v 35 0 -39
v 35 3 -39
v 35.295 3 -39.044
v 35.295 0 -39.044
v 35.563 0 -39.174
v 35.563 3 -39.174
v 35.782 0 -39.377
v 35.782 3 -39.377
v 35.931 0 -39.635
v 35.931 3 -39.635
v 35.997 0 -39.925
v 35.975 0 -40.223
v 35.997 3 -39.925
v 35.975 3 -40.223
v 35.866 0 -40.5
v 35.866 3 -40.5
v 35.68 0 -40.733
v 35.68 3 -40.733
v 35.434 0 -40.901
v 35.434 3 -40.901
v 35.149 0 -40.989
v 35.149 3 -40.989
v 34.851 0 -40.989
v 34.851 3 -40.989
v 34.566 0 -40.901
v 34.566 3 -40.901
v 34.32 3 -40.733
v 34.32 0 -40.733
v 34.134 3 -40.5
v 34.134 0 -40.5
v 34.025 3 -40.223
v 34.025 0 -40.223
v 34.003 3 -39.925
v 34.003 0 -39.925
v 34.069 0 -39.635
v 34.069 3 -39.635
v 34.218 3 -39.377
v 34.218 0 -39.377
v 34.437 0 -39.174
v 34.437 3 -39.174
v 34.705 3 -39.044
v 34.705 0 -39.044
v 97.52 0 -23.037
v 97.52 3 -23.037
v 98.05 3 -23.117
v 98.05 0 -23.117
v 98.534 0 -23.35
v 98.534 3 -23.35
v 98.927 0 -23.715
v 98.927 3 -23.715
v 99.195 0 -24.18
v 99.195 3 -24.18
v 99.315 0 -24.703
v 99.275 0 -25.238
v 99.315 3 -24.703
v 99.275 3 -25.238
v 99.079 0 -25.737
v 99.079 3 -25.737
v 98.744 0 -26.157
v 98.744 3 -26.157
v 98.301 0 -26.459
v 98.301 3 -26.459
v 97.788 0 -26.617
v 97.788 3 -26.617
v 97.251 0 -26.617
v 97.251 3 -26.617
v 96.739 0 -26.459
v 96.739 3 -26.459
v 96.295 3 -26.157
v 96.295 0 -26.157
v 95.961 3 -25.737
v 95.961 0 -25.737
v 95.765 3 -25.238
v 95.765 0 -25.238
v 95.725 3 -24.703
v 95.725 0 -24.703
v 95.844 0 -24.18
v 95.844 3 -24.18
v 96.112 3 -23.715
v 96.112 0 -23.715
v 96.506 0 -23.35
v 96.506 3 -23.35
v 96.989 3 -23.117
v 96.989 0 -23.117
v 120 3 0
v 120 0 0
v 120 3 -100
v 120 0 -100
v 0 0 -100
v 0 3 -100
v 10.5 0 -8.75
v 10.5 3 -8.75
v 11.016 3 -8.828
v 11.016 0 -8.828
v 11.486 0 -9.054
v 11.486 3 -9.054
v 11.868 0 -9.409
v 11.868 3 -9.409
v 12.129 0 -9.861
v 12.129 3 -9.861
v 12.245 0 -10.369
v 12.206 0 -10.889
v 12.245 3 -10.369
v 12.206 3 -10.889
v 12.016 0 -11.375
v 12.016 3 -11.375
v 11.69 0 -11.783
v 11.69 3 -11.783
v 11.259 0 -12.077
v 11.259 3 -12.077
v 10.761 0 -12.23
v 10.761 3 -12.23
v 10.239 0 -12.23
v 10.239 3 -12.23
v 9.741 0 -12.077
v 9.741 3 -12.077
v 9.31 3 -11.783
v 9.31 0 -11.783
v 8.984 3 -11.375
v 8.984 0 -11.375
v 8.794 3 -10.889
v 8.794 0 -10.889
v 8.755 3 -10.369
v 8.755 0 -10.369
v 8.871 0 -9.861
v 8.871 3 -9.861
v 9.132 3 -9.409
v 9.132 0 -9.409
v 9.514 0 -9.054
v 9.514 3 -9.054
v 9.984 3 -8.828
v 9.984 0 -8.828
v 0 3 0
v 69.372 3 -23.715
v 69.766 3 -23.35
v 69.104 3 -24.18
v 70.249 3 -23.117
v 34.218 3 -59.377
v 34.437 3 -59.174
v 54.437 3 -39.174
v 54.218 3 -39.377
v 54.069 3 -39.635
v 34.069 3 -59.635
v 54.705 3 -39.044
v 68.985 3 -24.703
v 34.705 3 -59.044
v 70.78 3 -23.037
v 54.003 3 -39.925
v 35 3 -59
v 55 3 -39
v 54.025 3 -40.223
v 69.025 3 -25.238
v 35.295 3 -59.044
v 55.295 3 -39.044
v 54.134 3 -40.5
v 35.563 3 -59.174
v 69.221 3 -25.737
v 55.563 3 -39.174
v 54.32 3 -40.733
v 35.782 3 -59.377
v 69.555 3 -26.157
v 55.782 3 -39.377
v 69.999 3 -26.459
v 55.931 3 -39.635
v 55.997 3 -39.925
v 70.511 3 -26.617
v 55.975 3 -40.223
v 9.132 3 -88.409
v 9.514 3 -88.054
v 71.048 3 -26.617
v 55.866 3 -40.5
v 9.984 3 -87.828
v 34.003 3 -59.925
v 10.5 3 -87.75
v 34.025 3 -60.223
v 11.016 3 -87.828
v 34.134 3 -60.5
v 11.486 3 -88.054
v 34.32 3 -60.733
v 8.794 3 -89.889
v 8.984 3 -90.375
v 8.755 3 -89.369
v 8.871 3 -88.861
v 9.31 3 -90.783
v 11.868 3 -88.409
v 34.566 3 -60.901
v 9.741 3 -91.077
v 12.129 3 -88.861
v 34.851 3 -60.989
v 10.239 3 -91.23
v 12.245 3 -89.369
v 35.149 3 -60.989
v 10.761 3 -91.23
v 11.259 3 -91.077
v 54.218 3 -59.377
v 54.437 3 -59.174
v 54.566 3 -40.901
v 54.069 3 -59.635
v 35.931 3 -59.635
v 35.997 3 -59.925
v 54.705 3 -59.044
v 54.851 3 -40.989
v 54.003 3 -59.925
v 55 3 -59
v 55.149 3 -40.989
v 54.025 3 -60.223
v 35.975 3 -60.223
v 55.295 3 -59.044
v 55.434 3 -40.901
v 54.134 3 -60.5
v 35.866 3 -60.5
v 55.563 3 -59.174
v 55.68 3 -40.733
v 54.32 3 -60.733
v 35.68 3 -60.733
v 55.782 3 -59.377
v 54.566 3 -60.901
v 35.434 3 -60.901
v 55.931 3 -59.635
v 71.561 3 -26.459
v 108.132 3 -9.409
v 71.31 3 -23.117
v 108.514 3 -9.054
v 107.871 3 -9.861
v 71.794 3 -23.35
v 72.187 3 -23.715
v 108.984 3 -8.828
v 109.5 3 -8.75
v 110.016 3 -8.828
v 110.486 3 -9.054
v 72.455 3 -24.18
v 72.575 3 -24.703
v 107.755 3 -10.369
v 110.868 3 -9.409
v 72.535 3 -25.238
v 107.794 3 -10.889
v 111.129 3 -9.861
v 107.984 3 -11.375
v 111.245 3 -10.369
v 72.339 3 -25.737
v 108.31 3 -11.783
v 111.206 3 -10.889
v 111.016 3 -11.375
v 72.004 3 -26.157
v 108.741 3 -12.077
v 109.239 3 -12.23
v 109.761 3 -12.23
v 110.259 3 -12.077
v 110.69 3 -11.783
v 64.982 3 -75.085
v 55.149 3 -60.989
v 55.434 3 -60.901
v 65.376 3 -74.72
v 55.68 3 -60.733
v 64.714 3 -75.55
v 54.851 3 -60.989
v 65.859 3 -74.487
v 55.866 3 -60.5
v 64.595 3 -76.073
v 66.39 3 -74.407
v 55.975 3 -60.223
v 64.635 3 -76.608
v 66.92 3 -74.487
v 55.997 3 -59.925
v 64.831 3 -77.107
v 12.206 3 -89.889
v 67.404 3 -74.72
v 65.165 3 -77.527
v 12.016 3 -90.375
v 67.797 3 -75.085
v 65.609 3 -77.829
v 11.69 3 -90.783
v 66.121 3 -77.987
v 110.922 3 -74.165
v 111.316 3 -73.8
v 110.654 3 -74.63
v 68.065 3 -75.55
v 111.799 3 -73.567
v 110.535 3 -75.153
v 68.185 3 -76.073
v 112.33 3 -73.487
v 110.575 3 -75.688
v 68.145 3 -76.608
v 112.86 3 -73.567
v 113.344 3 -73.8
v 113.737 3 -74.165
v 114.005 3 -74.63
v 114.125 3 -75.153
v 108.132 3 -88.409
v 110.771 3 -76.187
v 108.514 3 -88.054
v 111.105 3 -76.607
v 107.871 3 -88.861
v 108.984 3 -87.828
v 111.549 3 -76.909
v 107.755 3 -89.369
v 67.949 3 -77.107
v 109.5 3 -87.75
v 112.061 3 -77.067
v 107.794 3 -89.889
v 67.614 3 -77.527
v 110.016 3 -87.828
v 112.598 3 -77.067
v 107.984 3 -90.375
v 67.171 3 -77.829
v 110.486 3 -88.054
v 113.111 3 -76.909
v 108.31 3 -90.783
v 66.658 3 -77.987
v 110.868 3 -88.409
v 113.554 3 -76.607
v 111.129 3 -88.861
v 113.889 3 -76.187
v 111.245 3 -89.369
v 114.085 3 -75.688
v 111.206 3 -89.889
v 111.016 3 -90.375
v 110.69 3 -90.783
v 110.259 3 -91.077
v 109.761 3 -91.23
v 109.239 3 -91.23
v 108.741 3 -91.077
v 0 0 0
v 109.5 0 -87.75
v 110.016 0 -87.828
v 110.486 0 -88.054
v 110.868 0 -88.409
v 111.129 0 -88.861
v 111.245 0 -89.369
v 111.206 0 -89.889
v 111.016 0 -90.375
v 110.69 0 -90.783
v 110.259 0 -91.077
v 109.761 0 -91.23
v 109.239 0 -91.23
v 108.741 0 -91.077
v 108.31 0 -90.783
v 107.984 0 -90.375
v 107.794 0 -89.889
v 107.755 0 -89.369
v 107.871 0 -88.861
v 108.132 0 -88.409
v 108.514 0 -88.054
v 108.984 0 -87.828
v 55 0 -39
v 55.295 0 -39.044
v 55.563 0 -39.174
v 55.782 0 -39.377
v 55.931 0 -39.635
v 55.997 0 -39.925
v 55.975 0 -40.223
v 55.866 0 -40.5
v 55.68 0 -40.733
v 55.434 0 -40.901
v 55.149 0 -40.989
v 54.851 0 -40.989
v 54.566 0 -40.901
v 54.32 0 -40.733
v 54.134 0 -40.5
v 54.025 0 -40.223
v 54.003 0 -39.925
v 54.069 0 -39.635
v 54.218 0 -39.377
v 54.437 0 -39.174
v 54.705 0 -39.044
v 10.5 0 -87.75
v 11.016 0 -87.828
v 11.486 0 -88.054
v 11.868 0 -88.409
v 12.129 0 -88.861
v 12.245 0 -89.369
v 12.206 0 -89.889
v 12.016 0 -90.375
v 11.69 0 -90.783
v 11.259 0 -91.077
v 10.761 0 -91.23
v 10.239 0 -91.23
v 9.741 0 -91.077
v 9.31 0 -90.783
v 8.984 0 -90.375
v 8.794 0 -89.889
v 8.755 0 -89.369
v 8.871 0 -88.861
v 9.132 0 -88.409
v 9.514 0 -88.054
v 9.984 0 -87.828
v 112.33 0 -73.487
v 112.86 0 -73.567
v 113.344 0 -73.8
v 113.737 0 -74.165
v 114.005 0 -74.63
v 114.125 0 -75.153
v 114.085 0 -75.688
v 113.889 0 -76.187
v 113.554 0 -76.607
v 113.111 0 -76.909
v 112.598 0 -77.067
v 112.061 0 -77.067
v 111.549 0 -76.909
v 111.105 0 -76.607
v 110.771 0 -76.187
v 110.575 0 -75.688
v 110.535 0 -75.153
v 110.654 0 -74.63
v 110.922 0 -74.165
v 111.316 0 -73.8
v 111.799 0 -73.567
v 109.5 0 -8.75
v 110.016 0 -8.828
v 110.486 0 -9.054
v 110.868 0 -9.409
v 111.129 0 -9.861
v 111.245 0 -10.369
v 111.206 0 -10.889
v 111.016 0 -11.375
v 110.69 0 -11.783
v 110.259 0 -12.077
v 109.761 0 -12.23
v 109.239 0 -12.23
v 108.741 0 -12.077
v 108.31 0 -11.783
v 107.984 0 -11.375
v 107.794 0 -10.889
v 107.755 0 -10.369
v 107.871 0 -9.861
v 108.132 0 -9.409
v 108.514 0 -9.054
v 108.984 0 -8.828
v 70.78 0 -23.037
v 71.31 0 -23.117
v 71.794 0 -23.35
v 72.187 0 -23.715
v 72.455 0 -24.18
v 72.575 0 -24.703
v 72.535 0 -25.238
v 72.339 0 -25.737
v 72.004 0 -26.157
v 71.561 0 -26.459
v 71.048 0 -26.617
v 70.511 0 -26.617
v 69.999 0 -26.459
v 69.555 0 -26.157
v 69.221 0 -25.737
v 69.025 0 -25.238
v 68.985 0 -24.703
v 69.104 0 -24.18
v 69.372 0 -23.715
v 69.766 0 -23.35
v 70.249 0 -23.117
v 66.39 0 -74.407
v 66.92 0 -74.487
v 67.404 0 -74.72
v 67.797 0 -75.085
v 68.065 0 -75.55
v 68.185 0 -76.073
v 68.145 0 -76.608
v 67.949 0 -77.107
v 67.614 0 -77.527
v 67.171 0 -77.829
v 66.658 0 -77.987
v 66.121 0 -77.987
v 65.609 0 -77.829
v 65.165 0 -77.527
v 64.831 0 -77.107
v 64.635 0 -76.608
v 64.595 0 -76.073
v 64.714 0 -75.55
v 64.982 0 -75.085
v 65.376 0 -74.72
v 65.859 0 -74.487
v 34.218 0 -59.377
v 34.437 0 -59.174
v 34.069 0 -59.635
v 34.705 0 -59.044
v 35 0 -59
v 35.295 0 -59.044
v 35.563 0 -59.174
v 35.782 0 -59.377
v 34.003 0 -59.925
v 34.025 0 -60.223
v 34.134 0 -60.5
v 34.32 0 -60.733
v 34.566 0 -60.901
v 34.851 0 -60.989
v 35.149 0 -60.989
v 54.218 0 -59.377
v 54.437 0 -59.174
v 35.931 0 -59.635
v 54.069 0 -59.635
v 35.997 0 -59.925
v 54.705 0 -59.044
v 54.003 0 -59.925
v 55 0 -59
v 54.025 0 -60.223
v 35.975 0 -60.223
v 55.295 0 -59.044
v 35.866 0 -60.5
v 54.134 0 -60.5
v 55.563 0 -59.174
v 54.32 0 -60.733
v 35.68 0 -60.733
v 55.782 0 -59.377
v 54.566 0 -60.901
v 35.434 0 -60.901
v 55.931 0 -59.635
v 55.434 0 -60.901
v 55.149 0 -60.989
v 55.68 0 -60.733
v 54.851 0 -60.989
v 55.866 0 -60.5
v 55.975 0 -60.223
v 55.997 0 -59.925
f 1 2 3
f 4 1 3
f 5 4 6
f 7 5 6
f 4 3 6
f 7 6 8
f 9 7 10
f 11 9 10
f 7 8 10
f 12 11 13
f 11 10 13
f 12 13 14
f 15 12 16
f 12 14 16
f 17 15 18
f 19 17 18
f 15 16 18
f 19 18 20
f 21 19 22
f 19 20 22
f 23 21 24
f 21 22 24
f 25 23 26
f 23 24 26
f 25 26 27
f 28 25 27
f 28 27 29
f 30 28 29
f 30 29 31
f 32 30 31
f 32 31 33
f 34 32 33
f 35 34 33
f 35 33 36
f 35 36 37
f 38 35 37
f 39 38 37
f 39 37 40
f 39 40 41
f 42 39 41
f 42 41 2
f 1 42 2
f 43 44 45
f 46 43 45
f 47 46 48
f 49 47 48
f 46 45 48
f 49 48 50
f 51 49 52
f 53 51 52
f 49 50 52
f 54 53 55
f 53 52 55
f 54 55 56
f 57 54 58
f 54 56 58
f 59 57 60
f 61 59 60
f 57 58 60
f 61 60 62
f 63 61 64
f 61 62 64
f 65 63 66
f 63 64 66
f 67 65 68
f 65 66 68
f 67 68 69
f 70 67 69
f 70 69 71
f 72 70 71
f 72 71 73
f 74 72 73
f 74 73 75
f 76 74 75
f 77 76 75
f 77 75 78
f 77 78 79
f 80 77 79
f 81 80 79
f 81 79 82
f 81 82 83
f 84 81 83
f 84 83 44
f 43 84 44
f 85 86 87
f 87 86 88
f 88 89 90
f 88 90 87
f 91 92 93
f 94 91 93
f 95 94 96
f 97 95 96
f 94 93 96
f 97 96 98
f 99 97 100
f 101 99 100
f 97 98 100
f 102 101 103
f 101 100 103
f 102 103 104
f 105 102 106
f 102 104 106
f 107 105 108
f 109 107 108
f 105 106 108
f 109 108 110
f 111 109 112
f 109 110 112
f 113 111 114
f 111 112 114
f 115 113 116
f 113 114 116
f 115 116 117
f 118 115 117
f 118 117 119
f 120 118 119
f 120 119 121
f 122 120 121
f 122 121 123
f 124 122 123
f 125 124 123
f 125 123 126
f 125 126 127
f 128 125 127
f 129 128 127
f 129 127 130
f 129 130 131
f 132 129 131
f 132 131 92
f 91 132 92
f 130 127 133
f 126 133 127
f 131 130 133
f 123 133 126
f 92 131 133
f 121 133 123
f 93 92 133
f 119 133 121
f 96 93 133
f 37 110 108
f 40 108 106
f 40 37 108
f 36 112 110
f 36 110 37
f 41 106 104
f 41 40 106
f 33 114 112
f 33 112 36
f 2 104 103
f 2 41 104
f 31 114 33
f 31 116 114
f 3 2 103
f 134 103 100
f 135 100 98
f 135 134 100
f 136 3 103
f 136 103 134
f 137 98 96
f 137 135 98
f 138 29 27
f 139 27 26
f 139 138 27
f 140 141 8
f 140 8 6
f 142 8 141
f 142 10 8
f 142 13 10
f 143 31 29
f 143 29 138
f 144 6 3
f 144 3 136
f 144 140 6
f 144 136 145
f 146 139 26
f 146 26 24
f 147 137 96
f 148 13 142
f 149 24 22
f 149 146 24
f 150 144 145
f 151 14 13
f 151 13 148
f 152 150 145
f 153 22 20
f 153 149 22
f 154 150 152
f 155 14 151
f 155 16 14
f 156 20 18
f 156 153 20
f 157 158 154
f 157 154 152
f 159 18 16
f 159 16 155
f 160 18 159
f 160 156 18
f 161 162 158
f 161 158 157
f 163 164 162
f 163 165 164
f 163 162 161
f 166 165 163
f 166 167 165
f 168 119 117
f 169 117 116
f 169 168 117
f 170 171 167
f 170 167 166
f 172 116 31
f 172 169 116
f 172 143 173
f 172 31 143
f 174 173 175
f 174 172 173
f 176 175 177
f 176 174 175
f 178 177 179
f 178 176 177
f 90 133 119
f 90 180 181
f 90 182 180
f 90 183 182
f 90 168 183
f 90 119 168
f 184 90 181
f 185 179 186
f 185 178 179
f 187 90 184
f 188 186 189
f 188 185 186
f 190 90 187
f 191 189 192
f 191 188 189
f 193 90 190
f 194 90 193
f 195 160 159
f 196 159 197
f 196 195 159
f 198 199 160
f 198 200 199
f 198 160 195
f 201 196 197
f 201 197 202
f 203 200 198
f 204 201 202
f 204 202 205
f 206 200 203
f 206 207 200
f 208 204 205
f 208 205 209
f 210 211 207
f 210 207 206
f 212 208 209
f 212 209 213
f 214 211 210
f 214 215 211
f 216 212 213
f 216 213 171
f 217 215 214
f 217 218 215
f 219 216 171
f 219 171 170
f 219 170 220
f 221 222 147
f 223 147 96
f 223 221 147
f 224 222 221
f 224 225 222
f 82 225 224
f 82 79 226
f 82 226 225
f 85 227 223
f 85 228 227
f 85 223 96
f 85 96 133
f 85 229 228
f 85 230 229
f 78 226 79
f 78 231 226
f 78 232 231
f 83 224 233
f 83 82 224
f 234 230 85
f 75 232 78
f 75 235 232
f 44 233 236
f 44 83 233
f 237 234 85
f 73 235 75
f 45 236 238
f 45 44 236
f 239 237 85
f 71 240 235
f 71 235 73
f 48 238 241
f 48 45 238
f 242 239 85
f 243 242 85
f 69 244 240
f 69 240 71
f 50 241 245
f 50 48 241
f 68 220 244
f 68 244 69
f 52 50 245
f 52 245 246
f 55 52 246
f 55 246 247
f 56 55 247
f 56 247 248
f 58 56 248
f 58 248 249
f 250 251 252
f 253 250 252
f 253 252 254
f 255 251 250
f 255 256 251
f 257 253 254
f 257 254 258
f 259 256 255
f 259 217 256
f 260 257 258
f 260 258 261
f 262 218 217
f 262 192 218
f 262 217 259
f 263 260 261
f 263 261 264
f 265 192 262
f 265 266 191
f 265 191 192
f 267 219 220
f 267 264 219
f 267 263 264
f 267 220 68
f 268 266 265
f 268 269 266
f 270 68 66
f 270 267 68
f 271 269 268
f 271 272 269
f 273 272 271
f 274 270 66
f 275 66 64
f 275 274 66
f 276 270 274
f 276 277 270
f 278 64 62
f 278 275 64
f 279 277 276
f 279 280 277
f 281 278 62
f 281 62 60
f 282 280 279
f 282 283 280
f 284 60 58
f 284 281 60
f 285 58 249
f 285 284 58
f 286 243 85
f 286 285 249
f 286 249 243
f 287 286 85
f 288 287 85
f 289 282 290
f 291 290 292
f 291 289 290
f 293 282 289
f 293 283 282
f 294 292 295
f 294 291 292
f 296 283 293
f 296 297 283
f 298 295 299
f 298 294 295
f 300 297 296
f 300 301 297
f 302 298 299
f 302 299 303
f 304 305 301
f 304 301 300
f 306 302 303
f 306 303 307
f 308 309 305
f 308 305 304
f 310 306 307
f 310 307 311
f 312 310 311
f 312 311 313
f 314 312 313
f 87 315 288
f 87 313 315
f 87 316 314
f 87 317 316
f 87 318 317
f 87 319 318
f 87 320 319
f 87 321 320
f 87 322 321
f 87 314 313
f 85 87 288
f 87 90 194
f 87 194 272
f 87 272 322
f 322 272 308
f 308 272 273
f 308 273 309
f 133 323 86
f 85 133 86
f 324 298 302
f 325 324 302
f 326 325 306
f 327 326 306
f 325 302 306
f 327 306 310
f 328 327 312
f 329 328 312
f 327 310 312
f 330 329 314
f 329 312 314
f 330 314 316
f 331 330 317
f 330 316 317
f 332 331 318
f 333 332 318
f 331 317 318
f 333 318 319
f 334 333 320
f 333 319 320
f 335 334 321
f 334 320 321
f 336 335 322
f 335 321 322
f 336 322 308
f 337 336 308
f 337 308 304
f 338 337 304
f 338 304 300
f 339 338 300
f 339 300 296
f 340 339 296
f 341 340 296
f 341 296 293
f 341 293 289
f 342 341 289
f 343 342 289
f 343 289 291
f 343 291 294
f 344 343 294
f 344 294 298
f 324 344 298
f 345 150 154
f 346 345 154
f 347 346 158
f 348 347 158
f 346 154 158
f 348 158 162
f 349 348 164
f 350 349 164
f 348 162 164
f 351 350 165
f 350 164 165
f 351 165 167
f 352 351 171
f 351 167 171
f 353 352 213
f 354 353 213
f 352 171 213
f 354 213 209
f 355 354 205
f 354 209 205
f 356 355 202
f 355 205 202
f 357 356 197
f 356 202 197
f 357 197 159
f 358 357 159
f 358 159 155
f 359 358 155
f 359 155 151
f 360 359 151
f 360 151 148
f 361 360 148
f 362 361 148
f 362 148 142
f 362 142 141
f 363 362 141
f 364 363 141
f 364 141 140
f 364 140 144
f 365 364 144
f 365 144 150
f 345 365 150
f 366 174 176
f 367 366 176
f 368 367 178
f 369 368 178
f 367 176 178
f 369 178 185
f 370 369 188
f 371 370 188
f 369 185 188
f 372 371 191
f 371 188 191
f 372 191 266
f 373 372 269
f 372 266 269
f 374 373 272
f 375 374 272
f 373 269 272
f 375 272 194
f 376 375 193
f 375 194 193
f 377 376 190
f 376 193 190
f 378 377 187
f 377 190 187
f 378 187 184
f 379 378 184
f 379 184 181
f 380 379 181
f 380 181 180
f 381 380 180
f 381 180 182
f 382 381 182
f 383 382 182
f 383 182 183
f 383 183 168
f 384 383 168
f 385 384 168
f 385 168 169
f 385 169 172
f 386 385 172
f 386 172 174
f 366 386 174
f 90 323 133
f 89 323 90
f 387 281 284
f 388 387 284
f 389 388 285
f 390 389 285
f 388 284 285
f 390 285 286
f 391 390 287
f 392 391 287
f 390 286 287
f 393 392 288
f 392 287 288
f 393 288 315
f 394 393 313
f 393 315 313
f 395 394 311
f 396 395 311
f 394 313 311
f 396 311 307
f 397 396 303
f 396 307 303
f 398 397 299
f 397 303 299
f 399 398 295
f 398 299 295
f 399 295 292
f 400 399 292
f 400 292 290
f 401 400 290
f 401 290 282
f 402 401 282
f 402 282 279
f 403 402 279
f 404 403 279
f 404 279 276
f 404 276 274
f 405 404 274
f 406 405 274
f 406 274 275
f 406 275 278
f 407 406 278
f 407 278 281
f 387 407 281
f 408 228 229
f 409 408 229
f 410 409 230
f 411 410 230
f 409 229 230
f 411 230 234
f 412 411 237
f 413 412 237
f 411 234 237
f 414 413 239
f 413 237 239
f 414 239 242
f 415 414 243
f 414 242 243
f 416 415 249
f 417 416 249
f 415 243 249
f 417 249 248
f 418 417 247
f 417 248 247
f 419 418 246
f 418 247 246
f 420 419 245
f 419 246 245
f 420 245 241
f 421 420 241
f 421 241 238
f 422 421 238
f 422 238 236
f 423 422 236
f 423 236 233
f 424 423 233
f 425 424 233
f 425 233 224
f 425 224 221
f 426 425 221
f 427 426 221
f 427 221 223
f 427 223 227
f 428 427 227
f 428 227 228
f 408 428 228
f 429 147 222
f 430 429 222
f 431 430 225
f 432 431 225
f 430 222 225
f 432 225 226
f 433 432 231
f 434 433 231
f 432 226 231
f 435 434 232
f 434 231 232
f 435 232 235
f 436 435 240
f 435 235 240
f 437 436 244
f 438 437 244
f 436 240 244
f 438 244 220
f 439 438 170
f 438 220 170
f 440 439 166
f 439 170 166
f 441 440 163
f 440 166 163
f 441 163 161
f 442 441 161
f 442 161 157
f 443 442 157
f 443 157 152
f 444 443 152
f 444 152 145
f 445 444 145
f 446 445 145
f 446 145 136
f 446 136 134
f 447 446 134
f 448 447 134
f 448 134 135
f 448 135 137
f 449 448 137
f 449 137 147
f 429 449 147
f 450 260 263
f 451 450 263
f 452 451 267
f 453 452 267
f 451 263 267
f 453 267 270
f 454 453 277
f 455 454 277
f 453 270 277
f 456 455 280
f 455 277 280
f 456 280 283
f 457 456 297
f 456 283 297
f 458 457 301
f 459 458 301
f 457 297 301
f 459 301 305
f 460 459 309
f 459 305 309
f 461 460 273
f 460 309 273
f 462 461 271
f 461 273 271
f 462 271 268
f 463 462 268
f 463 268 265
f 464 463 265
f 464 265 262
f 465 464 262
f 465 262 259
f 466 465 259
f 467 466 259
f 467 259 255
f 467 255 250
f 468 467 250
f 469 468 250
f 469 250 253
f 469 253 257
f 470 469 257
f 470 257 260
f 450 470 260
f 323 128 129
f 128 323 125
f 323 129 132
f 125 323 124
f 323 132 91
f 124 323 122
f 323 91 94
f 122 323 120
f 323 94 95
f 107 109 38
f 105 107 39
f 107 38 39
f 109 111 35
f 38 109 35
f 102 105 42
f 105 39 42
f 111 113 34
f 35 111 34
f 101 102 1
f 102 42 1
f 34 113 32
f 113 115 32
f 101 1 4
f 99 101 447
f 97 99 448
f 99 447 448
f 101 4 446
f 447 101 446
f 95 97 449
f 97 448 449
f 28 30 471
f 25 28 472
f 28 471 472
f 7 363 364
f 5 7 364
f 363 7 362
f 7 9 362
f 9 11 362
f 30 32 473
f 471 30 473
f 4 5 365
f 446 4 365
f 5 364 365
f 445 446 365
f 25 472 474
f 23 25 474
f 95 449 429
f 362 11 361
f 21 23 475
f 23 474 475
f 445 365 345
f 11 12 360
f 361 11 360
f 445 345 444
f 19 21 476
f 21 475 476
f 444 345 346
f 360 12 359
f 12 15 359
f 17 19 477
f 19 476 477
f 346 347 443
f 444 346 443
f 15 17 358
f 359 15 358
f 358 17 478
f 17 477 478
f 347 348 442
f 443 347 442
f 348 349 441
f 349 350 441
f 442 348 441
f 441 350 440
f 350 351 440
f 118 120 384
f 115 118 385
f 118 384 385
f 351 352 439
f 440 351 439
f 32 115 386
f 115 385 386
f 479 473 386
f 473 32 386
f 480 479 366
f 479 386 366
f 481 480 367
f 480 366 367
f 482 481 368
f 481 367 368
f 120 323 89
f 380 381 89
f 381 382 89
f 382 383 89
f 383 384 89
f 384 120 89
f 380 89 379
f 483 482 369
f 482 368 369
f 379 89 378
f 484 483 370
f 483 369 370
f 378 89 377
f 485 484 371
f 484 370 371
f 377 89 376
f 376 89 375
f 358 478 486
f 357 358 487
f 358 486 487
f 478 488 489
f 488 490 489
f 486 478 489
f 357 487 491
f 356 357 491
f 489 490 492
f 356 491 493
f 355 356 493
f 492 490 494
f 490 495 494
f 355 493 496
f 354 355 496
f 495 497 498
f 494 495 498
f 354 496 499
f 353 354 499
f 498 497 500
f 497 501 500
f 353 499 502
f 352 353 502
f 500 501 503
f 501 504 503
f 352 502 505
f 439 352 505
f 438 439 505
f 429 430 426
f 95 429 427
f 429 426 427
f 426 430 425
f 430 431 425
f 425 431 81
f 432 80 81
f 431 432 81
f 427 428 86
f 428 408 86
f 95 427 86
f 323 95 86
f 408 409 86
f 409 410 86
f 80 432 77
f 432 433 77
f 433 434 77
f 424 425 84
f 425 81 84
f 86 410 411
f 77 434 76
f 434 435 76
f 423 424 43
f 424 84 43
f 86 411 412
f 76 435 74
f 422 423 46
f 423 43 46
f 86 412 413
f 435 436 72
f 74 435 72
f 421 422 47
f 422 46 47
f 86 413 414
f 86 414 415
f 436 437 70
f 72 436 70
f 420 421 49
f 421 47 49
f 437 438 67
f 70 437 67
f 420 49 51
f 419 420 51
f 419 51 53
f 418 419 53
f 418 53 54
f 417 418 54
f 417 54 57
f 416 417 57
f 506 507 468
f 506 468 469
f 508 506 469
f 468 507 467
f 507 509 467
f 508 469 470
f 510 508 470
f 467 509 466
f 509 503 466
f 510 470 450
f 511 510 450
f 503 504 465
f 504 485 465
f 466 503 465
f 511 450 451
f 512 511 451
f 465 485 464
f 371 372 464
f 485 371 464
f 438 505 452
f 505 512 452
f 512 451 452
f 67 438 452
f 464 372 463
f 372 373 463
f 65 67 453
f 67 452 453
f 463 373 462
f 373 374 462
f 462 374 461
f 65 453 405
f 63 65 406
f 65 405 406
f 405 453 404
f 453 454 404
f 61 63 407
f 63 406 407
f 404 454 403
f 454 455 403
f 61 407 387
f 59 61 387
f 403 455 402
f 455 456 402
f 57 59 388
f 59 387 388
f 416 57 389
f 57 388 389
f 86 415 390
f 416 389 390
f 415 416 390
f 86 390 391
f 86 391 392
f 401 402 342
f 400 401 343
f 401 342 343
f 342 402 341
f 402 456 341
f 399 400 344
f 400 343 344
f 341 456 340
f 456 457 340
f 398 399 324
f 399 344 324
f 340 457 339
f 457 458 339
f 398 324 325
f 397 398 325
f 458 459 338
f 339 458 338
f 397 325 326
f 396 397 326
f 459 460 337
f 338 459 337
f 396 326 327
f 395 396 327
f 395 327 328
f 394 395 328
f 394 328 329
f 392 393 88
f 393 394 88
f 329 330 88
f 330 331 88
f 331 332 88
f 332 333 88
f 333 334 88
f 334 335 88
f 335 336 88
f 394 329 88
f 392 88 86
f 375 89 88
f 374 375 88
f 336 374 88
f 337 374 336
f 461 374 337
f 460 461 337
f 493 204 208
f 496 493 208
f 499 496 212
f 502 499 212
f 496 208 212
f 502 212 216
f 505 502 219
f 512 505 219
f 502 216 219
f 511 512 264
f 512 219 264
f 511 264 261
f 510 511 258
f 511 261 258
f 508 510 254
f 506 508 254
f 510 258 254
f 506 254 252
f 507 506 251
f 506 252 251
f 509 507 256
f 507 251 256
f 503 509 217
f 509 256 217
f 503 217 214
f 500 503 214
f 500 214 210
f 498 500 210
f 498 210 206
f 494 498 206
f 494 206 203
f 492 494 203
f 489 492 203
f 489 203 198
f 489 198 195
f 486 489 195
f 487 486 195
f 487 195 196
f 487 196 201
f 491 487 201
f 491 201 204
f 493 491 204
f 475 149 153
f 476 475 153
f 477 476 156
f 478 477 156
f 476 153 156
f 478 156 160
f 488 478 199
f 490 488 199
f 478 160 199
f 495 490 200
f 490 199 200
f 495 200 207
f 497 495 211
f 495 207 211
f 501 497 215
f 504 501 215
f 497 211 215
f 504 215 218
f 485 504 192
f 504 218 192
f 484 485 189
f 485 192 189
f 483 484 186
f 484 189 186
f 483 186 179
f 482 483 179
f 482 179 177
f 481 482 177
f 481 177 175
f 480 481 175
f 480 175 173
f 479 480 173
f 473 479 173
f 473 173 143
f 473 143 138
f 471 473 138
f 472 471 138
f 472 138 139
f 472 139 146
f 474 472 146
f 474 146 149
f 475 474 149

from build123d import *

# Parameters (mm, degrees)
SKETCH1_W           = 120
SKETCH1_H           = 100
BOSS_EXTRUDE1_DEPTH = 3
SKETCH2_R           = 1.75
HOLES_SPACERS_DEPTH = 10
HOLES_IMU_REACH     = 158.234
SKETCH3_R           = 1
HOLES_ARDUINO_REACH = 158.234
SKETCH4_R           = 1.8


with BuildPart() as part:
    # Sketch1 → Boss-Extrude1 (new body)
    with BuildSketch(Plane(origin=(0, 0, 0), x_dir=(1, 0, 0), z_dir=(0, 1, 0))):
        with Locations((60, 50)):
            Rectangle(SKETCH1_W, SKETCH1_H)
    extrude(amount=BOSS_EXTRUDE1_DEPTH)

    # Sketch2 → holes_spacers (cut)
    with BuildSketch(Plane(origin=(0, 3, 0), x_dir=(1, 0, 0), z_dir=(0, 1, 0))):
        with Locations(Location((10.5, 89.5, 0), (0, 0, 270))):
            Circle(SKETCH2_R)
        with Locations(Location((109.5, 89.5, 0), (0, 0, 270))):
            Circle(SKETCH2_R)
        with Locations(Location((109.5, 10.5, 0), (0, 0, 270))):
            Circle(SKETCH2_R)
        with Locations(Location((10.5, 10.5, 0), (0, 0, 270))):
            Circle(SKETCH2_R)
    extrude(amount=-HOLES_SPACERS_DEPTH, mode=Mode.SUBTRACT)

    # Sketch3 → holes_IMU (cut, up to next)
    with BuildSketch(Plane(origin=(0, 3, 0), x_dir=(1, 0, 0), z_dir=(0, 1, 0)), mode=Mode.PRIVATE) as holes_imu_sk1:
        with Locations(Location((35, 60, 0), (0, 0, 270))):
            Circle(SKETCH3_R)
    holes_imu_tool1 = extrude(holes_imu_sk1.sketch, amount=-HOLES_IMU_REACH, mode=Mode.PRIVATE) & part.part
    # Sketch3 → holes_IMU (cut, up to next)
    with BuildSketch(Plane(origin=(0, 3, 0), x_dir=(1, 0, 0), z_dir=(0, 1, 0)), mode=Mode.PRIVATE) as holes_imu_sk2:
        with Locations(Location((55, 60, 0), (0, 0, 270))):
            Circle(SKETCH3_R)
    holes_imu_tool2 = extrude(holes_imu_sk2.sketch, amount=-HOLES_IMU_REACH, mode=Mode.PRIVATE) & part.part
    # Sketch3 → holes_IMU (cut, up to next)
    with BuildSketch(Plane(origin=(0, 3, 0), x_dir=(1, 0, 0), z_dir=(0, 1, 0)), mode=Mode.PRIVATE) as holes_imu_sk3:
        with Locations(Location((55, 40, 0), (0, 0, 270))):
            Circle(SKETCH3_R)
    holes_imu_tool3 = extrude(holes_imu_sk3.sketch, amount=-HOLES_IMU_REACH, mode=Mode.PRIVATE) & part.part
    # Sketch3 → holes_IMU (cut, up to next)
    with BuildSketch(Plane(origin=(0, 3, 0), x_dir=(1, 0, 0), z_dir=(0, 1, 0)), mode=Mode.PRIVATE) as holes_imu_sk4:
        with Locations(Location((35, 40, 0), (0, 0, 270))):
            Circle(SKETCH3_R)
    holes_imu_tool4 = extrude(holes_imu_sk4.sketch, amount=-HOLES_IMU_REACH, mode=Mode.PRIVATE) & part.part
    add(holes_imu_tool1.solids().sort_by_distance((35, 3, -60))[0], mode=Mode.SUBTRACT)
    add(holes_imu_tool2.solids().sort_by_distance((55, 3, -60))[0], mode=Mode.SUBTRACT)
    add(holes_imu_tool3.solids().sort_by_distance((55, 3, -40))[0], mode=Mode.SUBTRACT)
    add(holes_imu_tool4.solids().sort_by_distance((35, 3, -40))[0], mode=Mode.SUBTRACT)

    # Sketch4 → holes_arduino (cut, up to next)
    with BuildSketch(Plane(origin=(0, 3, 0), x_dir=(1, 0, 0), z_dir=(0, 1, 0)), mode=Mode.PRIVATE) as holes_arduino_sk1:
        with Locations(Location((66.389668811, 76.207441627, 0), (0, 0, 270))):
            Circle(SKETCH4_R)
    holes_arduino_tool1 = extrude(holes_arduino_sk1.sketch, amount=-HOLES_ARDUINO_REACH, mode=Mode.PRIVATE) & part.part
    # Sketch4 → holes_arduino (cut, up to next)
    with BuildSketch(Plane(origin=(0, 3, 0), x_dir=(1, 0, 0), z_dir=(0, 1, 0)), mode=Mode.PRIVATE) as holes_arduino_sk2:
        with Locations(Location((112.329668811, 75.287441627, 0), (0, 0, 270))):
            Circle(SKETCH4_R)
    holes_arduino_tool2 = extrude(holes_arduino_sk2.sketch, amount=-HOLES_ARDUINO_REACH, mode=Mode.PRIVATE) & part.part
    # Sketch4 → holes_arduino (cut, up to next)
    with BuildSketch(Plane(origin=(0, 3, 0), x_dir=(1, 0, 0), z_dir=(0, 1, 0)), mode=Mode.PRIVATE) as holes_arduino_sk3:
        with Locations(Location((97.519668811, 24.837441627, 0), (0, 0, 270))):
            Circle(SKETCH4_R)
    holes_arduino_tool3 = extrude(holes_arduino_sk3.sketch, amount=-HOLES_ARDUINO_REACH, mode=Mode.PRIVATE) & part.part
    # Sketch4 → holes_arduino (cut, up to next)
    with BuildSketch(Plane(origin=(0, 3, 0), x_dir=(1, 0, 0), z_dir=(0, 1, 0)), mode=Mode.PRIVATE) as holes_arduino_sk4:
        with Locations(Location((70.779668811, 24.837441627, 0), (0, 0, 270))):
            Circle(SKETCH4_R)
    holes_arduino_tool4 = extrude(holes_arduino_sk4.sketch, amount=-HOLES_ARDUINO_REACH, mode=Mode.PRIVATE) & part.part
    add(holes_arduino_tool1.solids().sort_by_distance((66.389669, 3, -76.207442))[0], mode=Mode.SUBTRACT)
    add(holes_arduino_tool2.solids().sort_by_distance((112.329669, 3, -75.287442))[0], mode=Mode.SUBTRACT)
    add(holes_arduino_tool3.solids().sort_by_distance((97.519669, 3, -24.837442))[0], mode=Mode.SUBTRACT)
    add(holes_arduino_tool4.solids().sort_by_distance((70.779669, 3, -24.837442))[0], mode=Mode.SUBTRACT)


solid = part.part
